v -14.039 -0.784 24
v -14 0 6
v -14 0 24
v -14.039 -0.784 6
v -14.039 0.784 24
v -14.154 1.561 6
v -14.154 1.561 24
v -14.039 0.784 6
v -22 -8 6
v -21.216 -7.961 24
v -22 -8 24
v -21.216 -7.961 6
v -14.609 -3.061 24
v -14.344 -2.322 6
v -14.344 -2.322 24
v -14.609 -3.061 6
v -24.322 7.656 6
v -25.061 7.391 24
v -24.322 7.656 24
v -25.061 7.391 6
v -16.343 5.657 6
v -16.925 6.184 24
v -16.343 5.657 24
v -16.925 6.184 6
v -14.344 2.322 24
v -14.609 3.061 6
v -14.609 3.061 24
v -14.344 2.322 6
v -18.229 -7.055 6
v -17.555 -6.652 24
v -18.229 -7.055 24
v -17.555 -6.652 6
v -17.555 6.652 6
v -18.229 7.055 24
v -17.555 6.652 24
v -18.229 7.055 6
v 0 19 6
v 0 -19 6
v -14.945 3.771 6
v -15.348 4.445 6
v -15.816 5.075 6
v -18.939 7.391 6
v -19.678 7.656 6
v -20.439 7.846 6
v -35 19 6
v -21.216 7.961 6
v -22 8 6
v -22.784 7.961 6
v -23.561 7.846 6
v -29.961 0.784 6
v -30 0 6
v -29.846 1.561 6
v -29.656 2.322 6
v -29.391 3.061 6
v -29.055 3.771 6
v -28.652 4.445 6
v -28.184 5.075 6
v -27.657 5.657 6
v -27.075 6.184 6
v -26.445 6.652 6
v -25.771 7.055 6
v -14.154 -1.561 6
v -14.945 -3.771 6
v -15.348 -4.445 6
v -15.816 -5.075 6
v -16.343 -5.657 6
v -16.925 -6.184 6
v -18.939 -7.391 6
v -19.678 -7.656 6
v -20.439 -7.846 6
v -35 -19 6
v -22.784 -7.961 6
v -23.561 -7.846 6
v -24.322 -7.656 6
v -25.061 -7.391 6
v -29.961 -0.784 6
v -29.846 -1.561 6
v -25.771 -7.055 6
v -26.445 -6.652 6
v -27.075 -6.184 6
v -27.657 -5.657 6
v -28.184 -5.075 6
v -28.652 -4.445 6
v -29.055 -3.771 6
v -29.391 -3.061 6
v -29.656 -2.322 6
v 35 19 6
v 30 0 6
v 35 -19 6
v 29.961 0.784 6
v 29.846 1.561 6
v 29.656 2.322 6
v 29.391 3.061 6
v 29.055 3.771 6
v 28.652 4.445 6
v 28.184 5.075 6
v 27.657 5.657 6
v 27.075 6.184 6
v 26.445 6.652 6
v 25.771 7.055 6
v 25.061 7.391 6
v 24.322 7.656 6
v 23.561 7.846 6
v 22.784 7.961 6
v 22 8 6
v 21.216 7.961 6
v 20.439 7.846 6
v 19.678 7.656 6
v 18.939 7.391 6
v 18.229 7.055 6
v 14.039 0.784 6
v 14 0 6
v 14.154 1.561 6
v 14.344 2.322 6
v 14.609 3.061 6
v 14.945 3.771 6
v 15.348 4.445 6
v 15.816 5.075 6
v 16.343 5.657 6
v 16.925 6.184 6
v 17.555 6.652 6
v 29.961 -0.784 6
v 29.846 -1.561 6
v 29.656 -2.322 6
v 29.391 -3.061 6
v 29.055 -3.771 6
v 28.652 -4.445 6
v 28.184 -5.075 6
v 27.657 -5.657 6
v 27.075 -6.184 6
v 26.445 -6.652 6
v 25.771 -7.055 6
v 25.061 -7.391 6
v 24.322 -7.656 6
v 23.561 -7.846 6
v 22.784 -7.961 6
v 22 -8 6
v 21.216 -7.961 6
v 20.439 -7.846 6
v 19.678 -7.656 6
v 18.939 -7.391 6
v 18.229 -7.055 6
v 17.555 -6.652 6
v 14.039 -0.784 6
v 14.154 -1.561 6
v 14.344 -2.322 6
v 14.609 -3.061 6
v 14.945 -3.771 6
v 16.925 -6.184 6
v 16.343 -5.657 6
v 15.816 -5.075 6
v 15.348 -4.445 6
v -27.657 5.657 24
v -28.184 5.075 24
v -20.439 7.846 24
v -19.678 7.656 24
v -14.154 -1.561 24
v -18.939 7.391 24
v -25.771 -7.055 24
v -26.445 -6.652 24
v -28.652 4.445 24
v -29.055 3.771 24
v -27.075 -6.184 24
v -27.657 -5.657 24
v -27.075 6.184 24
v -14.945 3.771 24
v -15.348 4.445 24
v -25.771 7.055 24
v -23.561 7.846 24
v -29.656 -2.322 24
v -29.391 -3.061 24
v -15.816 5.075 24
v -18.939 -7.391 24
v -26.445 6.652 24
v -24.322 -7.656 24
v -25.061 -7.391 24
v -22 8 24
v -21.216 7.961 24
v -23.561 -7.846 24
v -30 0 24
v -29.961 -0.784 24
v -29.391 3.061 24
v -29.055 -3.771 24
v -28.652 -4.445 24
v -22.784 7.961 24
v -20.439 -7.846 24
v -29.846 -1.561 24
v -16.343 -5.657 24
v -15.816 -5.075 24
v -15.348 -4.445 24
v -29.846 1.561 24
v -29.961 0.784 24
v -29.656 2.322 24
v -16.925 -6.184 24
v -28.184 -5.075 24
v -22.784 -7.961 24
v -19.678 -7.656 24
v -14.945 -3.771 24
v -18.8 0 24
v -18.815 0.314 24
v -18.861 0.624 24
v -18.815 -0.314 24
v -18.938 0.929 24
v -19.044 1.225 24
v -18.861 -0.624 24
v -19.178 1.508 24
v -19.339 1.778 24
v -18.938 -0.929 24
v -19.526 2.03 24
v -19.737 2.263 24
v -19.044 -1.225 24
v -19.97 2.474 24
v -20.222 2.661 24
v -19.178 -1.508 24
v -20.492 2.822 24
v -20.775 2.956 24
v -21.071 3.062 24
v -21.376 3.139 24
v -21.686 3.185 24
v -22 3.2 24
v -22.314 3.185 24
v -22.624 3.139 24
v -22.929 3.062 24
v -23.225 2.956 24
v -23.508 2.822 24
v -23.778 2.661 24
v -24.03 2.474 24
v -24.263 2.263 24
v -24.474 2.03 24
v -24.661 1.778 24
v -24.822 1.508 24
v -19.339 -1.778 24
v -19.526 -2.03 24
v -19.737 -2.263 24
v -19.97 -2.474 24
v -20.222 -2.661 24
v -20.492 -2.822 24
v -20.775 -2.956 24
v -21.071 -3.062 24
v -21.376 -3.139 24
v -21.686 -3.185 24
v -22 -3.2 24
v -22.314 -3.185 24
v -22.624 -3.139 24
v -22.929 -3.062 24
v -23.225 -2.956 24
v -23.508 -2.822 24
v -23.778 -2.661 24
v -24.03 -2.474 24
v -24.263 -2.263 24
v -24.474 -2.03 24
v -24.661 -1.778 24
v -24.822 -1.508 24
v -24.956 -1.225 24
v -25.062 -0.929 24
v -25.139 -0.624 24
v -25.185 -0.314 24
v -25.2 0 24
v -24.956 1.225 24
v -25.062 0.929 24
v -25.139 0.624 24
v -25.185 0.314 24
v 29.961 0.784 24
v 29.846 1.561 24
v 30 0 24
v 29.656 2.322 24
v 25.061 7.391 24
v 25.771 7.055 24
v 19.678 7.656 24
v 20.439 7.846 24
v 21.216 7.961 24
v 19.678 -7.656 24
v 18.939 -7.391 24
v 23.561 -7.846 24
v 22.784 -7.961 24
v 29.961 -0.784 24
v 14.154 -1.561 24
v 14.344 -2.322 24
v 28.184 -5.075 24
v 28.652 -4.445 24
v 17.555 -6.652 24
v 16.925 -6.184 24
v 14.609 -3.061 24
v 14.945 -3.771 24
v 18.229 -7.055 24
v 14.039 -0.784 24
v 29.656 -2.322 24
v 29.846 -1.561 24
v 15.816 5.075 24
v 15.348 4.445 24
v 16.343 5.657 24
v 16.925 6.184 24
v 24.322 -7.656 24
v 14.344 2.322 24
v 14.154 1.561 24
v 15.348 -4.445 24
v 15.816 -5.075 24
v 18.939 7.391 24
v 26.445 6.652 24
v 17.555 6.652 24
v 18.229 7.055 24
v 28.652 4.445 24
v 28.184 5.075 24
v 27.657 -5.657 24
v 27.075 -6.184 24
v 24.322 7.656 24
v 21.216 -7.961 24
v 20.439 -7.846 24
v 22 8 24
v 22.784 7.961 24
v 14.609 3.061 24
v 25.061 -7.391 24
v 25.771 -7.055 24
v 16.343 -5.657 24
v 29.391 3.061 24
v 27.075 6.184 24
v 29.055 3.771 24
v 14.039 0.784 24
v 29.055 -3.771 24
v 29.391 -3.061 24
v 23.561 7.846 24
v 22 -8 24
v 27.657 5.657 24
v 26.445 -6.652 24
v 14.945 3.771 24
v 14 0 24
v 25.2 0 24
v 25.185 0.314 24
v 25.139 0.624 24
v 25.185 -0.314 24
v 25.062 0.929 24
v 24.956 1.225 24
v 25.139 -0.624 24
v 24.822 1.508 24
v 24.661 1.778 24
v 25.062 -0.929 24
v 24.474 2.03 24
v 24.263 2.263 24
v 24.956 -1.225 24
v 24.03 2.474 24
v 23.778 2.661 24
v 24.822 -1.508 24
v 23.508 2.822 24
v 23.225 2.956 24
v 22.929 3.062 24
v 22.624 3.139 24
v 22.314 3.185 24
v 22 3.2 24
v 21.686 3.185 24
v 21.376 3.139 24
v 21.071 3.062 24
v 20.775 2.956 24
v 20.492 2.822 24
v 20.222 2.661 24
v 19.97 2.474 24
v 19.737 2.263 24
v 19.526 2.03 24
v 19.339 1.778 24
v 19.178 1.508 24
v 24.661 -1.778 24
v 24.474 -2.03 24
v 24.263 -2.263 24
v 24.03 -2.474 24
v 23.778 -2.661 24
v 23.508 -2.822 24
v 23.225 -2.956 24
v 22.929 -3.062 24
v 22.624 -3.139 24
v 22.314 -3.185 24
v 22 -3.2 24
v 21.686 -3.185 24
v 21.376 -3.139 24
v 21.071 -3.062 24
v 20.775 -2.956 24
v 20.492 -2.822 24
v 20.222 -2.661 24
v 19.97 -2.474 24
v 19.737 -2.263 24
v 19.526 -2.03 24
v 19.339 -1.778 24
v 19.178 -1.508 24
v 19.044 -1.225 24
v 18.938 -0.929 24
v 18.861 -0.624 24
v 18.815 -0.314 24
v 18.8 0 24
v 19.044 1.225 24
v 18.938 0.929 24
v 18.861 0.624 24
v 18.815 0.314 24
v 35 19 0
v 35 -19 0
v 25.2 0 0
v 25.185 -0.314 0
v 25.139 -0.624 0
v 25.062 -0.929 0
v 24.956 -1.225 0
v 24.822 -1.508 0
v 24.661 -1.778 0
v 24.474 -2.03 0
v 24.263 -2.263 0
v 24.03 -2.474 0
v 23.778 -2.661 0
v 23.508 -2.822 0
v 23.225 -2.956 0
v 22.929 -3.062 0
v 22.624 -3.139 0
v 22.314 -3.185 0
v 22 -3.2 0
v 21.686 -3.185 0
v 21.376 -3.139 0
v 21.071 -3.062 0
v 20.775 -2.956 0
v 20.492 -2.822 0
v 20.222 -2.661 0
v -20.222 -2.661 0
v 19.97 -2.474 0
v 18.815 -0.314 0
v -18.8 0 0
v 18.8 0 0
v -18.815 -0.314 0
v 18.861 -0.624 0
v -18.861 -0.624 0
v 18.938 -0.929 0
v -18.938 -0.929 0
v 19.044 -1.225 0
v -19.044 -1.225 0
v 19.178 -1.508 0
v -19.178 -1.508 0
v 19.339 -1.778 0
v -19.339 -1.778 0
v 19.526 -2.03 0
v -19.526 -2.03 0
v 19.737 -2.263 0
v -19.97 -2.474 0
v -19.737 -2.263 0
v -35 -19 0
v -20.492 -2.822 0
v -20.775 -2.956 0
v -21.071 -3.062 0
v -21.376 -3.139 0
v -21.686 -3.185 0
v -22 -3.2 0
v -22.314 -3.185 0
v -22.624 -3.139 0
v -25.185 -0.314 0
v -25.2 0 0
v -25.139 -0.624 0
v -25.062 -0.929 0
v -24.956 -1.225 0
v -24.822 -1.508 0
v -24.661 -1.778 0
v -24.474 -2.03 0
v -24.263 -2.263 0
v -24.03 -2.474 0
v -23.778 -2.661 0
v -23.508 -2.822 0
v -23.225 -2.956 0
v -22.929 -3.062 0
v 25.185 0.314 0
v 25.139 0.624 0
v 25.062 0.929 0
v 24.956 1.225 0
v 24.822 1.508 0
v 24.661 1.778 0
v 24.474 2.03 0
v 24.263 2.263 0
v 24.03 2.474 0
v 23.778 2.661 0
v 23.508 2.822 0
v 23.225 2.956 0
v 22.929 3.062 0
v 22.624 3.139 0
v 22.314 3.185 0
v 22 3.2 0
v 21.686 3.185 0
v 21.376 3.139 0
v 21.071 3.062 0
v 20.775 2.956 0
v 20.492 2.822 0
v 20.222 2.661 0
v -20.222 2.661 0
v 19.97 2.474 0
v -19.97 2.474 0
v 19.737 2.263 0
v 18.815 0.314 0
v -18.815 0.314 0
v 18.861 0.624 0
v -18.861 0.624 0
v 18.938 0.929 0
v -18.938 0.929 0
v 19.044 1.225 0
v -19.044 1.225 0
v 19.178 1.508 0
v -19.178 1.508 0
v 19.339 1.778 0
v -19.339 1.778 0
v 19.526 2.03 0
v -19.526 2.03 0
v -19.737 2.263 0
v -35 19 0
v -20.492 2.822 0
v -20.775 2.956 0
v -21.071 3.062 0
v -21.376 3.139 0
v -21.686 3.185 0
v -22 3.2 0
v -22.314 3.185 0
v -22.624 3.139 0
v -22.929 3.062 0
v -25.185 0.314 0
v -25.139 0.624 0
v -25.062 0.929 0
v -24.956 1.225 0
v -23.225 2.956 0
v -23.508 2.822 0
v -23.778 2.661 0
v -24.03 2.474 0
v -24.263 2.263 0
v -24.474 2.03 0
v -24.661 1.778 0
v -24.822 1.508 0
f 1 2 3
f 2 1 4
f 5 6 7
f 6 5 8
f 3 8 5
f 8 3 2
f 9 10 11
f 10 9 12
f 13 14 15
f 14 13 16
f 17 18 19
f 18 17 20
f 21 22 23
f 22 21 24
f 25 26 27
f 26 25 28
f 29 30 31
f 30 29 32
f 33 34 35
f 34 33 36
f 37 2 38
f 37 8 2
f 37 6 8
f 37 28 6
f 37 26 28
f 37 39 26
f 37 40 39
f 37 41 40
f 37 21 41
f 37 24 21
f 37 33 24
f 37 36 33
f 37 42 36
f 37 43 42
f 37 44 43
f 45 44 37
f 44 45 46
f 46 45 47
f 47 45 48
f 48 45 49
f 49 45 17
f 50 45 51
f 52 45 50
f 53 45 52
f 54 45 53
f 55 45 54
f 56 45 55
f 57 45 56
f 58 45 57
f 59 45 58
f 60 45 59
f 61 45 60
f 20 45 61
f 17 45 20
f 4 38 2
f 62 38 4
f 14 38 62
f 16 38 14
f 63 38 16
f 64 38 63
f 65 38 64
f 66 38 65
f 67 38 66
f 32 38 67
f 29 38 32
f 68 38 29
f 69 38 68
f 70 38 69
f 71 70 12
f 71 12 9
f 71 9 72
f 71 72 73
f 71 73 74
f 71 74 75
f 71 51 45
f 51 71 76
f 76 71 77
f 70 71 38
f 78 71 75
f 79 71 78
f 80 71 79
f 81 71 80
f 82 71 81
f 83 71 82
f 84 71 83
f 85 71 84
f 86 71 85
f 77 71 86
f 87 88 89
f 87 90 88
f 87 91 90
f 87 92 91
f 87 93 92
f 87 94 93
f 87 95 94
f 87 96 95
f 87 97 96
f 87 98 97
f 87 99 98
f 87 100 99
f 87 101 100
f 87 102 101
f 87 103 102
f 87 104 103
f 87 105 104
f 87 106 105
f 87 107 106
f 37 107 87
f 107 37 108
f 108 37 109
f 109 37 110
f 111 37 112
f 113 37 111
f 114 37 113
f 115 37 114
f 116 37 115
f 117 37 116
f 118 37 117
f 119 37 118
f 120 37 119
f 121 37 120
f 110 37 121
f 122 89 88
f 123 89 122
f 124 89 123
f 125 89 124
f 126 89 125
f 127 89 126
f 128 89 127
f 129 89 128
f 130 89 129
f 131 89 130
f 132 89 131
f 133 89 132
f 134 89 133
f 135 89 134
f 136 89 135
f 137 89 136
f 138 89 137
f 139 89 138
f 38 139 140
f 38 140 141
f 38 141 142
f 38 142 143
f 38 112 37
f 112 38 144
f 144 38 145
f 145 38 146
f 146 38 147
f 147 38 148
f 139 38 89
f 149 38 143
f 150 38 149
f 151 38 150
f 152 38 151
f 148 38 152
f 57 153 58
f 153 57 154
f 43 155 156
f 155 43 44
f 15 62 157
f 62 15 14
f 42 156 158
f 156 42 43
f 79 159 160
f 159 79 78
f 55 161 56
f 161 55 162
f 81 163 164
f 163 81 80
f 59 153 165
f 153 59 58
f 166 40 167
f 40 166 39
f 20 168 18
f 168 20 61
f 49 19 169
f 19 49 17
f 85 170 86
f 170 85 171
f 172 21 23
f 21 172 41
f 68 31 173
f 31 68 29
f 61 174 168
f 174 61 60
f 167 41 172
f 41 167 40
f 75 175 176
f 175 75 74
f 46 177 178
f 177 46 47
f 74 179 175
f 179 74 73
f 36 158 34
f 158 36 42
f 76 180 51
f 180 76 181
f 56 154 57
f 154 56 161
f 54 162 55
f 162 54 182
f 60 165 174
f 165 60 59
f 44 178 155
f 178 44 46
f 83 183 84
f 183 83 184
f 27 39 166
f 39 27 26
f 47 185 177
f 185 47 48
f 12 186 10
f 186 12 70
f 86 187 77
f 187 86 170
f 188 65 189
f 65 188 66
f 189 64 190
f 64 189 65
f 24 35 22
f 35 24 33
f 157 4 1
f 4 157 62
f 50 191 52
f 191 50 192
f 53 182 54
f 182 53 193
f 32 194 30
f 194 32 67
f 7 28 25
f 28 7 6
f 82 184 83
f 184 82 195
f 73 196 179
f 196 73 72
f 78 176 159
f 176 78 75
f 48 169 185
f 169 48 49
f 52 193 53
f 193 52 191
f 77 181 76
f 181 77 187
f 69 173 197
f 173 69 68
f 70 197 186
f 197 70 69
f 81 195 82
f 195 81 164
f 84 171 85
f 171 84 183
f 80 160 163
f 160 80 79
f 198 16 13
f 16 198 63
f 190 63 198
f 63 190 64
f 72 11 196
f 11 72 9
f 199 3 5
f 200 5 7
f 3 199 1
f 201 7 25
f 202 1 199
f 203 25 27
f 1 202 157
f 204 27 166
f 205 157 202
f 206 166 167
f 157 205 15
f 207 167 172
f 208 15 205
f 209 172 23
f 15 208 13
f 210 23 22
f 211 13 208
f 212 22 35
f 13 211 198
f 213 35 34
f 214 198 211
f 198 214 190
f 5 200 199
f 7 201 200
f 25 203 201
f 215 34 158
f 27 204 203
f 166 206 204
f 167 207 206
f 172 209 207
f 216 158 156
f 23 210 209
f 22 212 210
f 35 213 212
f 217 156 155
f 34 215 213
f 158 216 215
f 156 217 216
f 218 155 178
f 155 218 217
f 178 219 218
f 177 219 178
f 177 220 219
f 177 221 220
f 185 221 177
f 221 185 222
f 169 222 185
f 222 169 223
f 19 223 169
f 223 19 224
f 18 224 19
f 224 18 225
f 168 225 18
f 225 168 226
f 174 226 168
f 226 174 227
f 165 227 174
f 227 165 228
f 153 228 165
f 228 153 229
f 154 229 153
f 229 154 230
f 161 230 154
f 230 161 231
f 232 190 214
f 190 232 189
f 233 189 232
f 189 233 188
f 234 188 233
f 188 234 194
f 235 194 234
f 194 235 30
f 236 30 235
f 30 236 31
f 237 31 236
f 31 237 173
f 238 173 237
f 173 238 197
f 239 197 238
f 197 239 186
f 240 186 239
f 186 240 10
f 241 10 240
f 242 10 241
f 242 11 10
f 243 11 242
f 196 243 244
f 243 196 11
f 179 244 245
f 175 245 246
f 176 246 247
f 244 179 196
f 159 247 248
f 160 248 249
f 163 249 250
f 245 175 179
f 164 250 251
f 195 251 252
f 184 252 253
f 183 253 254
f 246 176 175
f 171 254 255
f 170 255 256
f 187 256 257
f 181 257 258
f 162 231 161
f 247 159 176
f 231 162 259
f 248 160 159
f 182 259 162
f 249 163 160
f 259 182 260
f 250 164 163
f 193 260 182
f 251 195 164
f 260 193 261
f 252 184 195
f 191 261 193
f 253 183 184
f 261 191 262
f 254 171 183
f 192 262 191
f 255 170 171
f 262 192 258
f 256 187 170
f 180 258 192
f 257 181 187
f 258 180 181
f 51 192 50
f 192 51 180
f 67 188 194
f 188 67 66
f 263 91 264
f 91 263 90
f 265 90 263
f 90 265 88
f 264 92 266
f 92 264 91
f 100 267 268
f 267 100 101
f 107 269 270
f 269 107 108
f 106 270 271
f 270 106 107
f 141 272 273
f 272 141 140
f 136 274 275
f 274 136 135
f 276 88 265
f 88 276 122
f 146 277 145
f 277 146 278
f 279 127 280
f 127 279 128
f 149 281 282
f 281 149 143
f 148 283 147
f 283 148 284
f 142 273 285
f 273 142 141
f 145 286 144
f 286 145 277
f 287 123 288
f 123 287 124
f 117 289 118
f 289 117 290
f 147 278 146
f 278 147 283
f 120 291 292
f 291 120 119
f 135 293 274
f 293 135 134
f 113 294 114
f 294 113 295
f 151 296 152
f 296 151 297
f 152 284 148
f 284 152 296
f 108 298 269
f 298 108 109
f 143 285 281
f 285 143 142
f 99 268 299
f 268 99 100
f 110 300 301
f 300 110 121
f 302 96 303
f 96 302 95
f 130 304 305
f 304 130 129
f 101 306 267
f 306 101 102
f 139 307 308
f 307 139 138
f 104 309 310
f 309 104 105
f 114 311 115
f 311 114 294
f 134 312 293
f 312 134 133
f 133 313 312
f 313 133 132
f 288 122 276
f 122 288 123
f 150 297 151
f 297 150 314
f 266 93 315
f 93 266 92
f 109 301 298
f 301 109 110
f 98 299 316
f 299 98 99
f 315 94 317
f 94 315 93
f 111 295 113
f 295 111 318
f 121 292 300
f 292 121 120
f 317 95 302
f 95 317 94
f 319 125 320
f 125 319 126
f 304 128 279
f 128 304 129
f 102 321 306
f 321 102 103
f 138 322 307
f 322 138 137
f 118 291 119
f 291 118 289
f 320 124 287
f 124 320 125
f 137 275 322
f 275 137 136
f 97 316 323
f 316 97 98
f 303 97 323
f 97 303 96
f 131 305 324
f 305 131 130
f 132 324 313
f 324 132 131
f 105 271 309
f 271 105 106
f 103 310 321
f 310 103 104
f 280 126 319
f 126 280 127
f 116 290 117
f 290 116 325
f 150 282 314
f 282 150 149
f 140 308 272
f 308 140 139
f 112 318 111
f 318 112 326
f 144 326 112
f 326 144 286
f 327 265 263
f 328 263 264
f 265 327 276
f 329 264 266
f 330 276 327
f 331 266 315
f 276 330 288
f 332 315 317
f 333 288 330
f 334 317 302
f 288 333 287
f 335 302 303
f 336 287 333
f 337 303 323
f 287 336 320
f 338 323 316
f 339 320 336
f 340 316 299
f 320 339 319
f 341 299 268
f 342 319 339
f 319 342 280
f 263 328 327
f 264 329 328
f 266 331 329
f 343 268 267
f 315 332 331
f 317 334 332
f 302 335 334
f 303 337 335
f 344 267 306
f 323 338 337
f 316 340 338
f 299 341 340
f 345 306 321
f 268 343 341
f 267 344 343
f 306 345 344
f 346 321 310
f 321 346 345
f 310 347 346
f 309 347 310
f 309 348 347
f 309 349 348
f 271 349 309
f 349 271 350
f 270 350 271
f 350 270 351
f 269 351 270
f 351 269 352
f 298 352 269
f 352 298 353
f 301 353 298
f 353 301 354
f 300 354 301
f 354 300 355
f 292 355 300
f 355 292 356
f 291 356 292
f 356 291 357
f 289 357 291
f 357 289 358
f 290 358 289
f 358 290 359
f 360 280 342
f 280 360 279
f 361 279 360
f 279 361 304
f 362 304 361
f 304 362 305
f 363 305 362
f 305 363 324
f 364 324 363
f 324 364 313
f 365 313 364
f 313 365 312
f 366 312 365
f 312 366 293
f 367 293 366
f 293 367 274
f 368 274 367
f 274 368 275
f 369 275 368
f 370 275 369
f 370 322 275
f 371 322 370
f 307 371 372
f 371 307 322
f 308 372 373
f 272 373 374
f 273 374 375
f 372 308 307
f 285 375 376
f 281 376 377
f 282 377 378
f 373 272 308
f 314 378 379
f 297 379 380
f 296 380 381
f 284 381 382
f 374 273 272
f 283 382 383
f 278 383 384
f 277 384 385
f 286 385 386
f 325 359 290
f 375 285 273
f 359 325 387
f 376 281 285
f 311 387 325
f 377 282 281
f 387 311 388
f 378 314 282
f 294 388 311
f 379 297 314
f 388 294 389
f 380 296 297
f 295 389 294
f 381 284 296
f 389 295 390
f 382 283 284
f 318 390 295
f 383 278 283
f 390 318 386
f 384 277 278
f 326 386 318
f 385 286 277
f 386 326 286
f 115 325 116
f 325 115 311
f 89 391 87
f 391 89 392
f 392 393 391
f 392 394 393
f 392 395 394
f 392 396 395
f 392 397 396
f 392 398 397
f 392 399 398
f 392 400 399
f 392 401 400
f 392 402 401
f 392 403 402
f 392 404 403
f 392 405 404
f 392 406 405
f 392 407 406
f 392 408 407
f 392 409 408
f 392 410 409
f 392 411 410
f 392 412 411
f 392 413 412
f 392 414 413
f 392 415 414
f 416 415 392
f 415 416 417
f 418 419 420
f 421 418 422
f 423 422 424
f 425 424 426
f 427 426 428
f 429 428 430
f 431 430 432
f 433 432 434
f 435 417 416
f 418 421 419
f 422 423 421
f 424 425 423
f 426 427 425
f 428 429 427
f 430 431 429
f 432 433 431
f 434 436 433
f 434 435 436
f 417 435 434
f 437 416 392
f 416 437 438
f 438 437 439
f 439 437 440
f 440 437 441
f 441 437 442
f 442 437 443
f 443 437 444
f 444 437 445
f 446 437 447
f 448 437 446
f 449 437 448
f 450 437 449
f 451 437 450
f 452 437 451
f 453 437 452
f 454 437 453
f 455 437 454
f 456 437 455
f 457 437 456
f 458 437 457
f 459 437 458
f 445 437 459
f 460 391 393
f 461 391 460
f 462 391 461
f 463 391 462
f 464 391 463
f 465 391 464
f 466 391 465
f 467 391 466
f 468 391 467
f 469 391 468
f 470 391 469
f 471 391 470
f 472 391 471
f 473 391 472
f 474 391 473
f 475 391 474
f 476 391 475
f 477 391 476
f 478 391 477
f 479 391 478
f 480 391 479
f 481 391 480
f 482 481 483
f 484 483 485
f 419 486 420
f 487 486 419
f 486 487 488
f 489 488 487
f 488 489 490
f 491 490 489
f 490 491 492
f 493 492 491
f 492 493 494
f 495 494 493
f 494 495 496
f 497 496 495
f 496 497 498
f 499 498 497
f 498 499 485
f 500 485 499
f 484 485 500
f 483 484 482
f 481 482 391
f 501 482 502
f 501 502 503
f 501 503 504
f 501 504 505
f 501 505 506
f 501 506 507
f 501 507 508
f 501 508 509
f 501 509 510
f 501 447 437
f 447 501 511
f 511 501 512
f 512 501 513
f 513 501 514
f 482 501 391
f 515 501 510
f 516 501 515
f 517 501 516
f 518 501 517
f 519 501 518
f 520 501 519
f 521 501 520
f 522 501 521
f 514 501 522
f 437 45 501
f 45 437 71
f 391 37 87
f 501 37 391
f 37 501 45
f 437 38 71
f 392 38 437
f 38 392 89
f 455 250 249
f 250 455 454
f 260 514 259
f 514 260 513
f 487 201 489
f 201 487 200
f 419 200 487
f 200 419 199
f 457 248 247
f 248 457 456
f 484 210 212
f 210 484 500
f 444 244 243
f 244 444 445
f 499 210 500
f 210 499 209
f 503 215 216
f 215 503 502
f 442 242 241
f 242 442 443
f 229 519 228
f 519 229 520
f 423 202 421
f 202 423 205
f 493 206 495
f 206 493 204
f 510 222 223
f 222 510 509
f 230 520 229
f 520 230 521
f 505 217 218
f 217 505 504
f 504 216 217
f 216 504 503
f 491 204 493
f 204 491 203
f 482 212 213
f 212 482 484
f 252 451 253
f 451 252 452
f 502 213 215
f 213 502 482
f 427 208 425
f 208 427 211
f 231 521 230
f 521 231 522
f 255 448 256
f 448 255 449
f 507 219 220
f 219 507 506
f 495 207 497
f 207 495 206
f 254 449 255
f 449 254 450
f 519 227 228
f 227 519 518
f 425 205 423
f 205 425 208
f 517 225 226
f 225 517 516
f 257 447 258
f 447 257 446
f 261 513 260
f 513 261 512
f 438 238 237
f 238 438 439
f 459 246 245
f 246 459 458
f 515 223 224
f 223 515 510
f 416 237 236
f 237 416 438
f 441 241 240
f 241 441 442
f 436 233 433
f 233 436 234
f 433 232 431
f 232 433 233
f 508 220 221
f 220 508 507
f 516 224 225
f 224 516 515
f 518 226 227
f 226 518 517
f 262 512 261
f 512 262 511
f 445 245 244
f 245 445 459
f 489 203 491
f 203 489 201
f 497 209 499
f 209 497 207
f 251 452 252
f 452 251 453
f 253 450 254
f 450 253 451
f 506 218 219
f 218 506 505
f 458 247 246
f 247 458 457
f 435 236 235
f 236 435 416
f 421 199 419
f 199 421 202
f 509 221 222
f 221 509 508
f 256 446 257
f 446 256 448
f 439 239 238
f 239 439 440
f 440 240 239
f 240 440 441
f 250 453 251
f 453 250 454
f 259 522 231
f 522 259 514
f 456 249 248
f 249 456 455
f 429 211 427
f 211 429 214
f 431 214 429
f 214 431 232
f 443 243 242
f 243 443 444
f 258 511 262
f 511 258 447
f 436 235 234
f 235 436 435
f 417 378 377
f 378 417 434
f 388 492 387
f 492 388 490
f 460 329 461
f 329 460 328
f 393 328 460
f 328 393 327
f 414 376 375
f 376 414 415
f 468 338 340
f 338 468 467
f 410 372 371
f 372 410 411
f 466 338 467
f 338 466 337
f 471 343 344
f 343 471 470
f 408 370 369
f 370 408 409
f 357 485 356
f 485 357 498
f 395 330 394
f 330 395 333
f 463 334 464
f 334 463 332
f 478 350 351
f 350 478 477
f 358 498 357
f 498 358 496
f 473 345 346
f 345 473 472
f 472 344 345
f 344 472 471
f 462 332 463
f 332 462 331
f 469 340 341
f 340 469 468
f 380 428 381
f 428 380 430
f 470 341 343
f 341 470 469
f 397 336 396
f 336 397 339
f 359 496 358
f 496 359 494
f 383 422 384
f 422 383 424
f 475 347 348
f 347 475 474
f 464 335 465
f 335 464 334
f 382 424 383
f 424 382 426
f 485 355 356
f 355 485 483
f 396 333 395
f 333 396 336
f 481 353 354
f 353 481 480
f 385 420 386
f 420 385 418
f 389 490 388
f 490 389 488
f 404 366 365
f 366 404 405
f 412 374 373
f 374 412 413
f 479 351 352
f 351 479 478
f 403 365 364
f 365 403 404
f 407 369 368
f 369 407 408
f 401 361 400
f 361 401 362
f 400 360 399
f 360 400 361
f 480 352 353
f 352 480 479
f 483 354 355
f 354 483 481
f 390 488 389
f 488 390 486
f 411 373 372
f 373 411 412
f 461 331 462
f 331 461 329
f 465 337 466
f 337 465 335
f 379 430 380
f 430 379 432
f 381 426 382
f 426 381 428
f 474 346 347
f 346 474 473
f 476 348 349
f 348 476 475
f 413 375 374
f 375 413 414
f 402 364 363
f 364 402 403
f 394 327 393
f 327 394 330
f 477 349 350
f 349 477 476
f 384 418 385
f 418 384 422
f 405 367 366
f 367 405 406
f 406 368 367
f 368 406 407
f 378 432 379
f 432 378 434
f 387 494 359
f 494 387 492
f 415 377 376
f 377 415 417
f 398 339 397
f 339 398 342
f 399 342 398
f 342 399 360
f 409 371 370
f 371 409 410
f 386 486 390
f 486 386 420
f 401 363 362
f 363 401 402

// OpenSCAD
$fn = 64;

plate = [70, 38, 6];
post_radius = 8;
hole_radius = 3.2;

difference() {
  union() {
    translate([0, 0, plate[2] / 2])
      cube(plate, center = true);

    for (x = [-22, 22]) {
      translate([x, 0, plate[2]])
        cylinder(r = post_radius, h = 18);
    }
  }

  for (x = [-22, 22]) {
    translate([x, 0, -1])
      cylinder(r = hole_radius, h = 28);
  }

  translate([0, 0, plate[2] + 9])
    rotate([90, 0, 0])
      cylinder(r = 9, h = 50, center = true);
}
